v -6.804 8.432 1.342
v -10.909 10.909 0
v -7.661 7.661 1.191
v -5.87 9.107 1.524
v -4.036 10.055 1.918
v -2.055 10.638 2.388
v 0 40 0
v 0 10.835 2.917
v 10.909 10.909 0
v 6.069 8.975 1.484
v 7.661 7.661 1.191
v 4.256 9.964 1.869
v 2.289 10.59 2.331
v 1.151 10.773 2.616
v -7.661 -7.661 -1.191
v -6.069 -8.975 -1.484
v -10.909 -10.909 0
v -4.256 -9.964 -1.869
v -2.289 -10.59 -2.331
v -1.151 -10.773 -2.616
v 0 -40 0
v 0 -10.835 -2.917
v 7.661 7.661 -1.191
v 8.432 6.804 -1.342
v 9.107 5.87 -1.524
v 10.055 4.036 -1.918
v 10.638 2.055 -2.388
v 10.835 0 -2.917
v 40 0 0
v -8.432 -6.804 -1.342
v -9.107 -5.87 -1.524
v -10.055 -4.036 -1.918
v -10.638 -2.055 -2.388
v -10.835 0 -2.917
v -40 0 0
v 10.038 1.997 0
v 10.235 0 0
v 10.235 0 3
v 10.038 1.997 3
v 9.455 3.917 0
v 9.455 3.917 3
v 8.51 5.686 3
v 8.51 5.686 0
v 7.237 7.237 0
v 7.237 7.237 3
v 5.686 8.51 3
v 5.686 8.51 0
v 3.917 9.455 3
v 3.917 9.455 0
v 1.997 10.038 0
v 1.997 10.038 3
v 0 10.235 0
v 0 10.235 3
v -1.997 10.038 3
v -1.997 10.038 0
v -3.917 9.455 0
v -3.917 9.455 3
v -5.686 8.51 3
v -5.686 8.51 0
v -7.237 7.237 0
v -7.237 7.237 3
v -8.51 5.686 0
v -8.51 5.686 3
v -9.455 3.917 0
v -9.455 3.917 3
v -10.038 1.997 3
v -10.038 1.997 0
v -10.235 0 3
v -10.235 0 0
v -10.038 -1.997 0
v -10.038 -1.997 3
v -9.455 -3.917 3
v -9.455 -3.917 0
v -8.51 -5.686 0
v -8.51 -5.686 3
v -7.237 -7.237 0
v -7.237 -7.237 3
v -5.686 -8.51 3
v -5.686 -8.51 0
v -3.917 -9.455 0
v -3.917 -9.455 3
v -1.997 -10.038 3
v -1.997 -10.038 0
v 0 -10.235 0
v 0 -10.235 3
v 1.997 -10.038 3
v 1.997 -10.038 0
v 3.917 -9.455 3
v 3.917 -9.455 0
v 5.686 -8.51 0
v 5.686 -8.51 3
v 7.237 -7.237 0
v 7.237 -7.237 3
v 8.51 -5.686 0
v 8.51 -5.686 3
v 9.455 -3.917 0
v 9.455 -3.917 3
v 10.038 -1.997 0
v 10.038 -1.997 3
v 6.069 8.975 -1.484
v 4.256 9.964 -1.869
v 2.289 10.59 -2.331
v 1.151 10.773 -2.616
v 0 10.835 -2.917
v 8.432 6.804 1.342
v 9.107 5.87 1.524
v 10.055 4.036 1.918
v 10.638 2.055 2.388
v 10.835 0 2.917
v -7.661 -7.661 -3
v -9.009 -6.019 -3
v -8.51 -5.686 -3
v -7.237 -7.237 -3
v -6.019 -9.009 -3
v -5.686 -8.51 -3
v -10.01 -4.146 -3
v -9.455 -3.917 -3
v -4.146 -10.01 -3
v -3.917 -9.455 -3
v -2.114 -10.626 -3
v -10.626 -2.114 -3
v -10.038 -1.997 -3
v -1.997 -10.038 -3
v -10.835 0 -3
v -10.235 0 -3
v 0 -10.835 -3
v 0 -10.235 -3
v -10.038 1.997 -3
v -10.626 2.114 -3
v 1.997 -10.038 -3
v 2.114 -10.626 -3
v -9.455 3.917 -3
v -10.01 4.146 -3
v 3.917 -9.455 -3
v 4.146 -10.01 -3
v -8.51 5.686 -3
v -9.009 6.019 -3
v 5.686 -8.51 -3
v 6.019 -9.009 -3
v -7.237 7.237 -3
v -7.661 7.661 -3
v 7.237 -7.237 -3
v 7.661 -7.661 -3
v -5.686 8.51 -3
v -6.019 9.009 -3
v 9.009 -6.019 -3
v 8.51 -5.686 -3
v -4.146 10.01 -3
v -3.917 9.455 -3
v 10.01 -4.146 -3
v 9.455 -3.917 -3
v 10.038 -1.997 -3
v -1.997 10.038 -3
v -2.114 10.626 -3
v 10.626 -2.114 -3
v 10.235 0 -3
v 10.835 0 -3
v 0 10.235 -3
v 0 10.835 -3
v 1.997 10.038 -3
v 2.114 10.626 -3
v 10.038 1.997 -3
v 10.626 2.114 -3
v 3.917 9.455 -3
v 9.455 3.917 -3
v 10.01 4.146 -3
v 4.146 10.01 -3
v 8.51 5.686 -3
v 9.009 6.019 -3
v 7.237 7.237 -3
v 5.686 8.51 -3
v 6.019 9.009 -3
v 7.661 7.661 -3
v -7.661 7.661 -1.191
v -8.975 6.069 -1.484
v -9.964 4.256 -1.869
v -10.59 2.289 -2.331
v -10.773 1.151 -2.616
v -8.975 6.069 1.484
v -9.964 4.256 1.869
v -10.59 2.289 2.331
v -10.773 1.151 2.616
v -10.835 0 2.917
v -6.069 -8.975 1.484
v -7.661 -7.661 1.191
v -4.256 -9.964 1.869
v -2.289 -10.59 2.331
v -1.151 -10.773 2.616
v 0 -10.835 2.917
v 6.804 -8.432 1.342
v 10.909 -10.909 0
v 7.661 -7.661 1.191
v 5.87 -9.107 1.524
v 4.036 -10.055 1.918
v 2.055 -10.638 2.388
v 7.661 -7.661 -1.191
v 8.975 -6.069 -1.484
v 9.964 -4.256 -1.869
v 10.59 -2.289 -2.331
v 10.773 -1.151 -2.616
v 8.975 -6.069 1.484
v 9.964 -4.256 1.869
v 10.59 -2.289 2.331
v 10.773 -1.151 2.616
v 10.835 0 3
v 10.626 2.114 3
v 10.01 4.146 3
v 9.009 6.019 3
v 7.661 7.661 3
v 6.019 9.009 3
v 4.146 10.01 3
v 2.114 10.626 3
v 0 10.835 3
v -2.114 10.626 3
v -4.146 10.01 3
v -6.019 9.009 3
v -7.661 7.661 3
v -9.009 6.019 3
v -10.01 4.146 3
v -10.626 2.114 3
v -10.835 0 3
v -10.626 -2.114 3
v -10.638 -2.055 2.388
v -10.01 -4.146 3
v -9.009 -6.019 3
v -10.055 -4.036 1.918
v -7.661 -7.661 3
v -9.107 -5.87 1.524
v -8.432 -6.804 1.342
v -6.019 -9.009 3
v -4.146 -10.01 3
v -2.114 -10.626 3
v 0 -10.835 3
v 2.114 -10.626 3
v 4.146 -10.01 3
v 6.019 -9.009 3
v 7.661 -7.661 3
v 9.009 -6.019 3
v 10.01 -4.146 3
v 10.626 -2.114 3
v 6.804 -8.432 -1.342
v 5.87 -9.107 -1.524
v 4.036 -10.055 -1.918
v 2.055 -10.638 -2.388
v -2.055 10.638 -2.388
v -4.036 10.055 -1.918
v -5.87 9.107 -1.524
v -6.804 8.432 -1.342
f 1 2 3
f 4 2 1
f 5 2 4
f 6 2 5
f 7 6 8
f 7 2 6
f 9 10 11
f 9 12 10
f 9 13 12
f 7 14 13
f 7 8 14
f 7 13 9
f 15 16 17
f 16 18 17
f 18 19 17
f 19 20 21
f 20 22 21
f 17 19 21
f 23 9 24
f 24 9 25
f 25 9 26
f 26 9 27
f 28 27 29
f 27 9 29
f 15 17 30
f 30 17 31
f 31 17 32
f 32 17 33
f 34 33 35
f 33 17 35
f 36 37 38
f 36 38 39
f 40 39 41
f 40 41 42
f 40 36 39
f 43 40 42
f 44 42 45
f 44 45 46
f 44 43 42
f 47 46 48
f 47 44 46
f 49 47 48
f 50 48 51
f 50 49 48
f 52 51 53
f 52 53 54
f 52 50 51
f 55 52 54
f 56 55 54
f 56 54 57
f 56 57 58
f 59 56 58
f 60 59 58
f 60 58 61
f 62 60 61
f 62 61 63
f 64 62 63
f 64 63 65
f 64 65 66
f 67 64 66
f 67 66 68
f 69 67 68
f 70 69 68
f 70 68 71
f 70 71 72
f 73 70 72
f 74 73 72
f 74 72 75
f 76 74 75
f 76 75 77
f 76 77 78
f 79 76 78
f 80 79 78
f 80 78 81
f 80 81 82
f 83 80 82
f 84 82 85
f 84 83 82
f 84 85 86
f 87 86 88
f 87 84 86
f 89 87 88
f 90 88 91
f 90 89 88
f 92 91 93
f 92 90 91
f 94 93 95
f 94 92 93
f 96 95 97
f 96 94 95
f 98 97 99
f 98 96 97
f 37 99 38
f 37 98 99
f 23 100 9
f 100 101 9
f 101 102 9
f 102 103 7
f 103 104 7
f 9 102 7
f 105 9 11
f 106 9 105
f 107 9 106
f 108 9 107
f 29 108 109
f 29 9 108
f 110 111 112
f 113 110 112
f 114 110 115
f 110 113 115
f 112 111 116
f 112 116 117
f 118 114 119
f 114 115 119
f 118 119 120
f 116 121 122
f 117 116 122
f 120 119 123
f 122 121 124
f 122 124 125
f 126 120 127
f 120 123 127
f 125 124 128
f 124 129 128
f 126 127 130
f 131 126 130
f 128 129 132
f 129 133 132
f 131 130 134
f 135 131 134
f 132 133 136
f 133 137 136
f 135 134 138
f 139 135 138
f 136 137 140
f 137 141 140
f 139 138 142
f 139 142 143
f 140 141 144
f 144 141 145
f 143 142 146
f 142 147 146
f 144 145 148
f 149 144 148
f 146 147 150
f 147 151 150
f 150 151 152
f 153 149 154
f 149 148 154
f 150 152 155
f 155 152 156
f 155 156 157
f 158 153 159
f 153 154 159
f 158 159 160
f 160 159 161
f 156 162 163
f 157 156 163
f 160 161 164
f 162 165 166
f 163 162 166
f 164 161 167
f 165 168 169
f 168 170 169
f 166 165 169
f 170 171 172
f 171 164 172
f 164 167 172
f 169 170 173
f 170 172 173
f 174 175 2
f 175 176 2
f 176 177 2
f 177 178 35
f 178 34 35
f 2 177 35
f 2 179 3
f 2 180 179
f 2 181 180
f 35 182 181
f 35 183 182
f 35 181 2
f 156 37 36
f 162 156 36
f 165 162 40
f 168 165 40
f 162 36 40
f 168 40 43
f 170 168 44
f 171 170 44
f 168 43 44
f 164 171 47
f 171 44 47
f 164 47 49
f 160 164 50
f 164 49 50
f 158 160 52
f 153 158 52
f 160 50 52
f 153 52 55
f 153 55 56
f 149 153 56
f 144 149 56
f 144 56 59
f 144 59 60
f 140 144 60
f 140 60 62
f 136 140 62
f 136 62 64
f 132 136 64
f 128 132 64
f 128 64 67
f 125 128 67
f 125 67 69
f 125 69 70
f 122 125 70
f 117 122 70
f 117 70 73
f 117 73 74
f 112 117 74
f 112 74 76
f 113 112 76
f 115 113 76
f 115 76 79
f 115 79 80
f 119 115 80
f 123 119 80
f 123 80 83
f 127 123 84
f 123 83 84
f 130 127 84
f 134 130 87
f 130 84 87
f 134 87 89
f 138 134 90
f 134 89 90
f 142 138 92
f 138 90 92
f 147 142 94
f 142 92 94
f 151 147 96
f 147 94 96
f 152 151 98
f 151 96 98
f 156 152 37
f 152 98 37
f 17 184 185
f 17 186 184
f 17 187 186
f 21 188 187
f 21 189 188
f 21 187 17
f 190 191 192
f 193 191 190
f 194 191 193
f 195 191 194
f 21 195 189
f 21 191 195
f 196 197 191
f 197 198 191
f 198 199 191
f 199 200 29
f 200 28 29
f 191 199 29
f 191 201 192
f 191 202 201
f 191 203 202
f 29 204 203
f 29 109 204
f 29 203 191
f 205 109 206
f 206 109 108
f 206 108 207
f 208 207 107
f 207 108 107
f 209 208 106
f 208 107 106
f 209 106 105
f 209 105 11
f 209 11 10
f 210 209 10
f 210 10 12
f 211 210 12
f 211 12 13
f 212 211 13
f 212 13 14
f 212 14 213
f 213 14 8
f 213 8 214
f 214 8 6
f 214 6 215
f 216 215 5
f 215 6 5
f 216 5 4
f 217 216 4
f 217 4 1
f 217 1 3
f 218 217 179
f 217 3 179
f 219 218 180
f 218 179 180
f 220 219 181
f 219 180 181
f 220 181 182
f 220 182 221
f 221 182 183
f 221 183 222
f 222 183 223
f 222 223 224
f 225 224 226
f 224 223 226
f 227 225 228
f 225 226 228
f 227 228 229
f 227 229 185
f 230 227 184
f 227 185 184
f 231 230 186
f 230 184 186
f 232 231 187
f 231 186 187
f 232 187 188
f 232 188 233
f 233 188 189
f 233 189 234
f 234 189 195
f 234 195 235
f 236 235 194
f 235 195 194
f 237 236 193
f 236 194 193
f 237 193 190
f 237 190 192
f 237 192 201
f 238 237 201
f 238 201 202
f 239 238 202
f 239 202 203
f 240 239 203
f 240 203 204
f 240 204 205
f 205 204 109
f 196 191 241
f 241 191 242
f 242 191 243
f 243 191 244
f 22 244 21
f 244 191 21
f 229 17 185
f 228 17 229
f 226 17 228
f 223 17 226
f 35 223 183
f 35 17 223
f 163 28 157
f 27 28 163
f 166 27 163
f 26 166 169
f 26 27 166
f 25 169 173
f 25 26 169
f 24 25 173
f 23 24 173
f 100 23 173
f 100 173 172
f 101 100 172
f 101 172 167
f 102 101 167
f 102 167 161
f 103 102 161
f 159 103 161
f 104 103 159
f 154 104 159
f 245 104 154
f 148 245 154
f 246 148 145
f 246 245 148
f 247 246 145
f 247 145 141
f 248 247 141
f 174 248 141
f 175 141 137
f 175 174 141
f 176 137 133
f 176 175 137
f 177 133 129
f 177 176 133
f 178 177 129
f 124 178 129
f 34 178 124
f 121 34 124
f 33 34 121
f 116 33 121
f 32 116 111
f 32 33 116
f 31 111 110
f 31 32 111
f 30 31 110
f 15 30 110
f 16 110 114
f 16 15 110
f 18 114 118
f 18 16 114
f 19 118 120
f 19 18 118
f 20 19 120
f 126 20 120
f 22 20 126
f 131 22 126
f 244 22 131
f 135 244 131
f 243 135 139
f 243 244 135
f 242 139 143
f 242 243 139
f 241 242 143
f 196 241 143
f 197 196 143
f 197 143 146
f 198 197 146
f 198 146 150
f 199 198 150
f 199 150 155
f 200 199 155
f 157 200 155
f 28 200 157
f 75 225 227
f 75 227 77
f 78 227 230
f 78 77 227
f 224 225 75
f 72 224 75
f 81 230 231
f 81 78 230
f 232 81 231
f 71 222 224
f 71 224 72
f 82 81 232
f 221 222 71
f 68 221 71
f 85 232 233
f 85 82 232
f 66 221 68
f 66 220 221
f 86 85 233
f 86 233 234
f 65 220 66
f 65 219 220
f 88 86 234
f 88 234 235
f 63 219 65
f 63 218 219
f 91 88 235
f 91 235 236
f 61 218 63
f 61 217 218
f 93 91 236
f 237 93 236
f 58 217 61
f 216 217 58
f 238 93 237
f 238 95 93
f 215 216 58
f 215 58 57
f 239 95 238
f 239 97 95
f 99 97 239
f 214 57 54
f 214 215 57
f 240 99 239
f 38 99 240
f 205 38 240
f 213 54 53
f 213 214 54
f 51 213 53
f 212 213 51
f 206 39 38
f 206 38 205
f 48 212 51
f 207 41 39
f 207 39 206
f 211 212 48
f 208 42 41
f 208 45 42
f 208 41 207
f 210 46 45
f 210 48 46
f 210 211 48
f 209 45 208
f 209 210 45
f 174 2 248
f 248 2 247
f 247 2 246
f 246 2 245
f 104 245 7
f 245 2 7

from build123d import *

# Parameters (mm, degrees)
F3_COUNT = 4
F4_R     = 10.234547
F5_DEPTH = 25
F6_R     = 10.834547
F6_R_2   = 10.234547
F7_DEPTH = 3


with BuildPart() as f2:
    # F1 (on Front) → F2 section 0
    with BuildSketch(Plane.XZ, mode=Mode.PRIVATE) as f2_s0:
        Polygon((0, 4), (-15, 0), (15, 0), align=None)
    loft([f2_s0.sketch, Vertex(0, -40, 0)])

    # F3: F2 ×4 about axis
    f3_axis = Axis((0, 0, 1.111546), (0, 0, 1))


with BuildPart() as f2_1:
    add(f2.part)
    for i in range(1, F3_COUNT):
        add(f2.part.rotate(f3_axis, i * 360 / F3_COUNT))

    # F4 (on Top) → F5 (cut)
    with BuildSketch(Plane.XY):
        Circle(F4_R)
    extrude(amount=F5_DEPTH, mode=Mode.SUBTRACT)

    # F6 (on Top) → F7 (join)
    with BuildSketch(Plane.XY):
        Circle(F6_R)
        Circle(F6_R_2, mode=Mode.SUBTRACT)
    extrude(amount=F7_DEPTH)

    # F8: F2 across plane


with BuildPart() as f2_2:
    add(f2_1.part)
    add(f2_1.part.mirror(Plane.XY))


solid = f2_2.part
